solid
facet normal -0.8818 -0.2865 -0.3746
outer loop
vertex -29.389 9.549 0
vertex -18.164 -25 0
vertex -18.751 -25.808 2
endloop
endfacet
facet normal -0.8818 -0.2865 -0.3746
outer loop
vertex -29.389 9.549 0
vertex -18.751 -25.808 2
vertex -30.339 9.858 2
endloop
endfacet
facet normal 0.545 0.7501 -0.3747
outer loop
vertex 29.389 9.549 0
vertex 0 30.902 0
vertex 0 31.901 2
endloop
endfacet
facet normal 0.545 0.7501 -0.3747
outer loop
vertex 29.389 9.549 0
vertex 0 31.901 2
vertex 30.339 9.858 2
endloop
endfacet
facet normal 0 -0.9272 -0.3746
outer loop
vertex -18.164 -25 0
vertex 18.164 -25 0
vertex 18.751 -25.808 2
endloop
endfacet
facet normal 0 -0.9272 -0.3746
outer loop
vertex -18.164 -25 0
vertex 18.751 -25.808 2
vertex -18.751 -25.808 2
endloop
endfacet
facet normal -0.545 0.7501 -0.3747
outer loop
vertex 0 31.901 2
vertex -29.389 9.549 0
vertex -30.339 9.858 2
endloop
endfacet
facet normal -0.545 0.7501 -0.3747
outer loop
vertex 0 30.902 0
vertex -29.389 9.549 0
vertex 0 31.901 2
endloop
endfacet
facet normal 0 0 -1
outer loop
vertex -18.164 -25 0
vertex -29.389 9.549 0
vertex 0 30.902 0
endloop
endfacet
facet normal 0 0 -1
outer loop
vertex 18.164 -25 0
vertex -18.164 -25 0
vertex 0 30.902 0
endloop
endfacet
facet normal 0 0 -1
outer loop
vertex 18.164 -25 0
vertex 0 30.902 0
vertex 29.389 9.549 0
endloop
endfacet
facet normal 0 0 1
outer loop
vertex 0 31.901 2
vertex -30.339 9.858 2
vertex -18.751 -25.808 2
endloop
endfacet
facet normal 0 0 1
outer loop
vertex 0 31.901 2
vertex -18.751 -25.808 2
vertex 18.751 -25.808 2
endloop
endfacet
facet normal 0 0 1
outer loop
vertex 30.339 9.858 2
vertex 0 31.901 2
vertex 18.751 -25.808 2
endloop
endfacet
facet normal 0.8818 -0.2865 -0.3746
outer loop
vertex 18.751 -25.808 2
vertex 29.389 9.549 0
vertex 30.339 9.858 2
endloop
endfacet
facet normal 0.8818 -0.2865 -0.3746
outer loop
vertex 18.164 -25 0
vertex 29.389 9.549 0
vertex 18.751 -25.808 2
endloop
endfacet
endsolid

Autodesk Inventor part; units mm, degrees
ref_plane "YZ Plane" through (0, 0, 0) normal (1, 0, 0) x (0, 1, 0)
ref_plane "XZ Plane" through (0, 0, 0) normal (0, 1, 0) x (-1, 0, 0)
ref_plane "XY Plane" through (0, 0, 0) normal (0, 0, 1) x (1, 0, 0)
sketch "Sketch1" plane through (0, 0, 0) normal (0, 0, 1) x (1, 0, 0)
  line L0 (0, 30.9017) -> (29.3893, 9.5492)
  line L1 (29.3893, 9.5492) -> (18.1636, -25)
  line L2 (18.1636, -25) -> (-18.1636, -25)
  line L3 (-18.1636, -25) -> (-29.3893, 9.5492)
  line L4 (-29.3893, 9.5492) -> (0, 30.9017)
  point P0 (0, 0)
  point P1 (0, 0)
  dimension "d0" = 25
extrude "Extrusion1" add sketch "Sketch1" along normal blind 2 draft 22
properties part number "Face" material "Gold"
